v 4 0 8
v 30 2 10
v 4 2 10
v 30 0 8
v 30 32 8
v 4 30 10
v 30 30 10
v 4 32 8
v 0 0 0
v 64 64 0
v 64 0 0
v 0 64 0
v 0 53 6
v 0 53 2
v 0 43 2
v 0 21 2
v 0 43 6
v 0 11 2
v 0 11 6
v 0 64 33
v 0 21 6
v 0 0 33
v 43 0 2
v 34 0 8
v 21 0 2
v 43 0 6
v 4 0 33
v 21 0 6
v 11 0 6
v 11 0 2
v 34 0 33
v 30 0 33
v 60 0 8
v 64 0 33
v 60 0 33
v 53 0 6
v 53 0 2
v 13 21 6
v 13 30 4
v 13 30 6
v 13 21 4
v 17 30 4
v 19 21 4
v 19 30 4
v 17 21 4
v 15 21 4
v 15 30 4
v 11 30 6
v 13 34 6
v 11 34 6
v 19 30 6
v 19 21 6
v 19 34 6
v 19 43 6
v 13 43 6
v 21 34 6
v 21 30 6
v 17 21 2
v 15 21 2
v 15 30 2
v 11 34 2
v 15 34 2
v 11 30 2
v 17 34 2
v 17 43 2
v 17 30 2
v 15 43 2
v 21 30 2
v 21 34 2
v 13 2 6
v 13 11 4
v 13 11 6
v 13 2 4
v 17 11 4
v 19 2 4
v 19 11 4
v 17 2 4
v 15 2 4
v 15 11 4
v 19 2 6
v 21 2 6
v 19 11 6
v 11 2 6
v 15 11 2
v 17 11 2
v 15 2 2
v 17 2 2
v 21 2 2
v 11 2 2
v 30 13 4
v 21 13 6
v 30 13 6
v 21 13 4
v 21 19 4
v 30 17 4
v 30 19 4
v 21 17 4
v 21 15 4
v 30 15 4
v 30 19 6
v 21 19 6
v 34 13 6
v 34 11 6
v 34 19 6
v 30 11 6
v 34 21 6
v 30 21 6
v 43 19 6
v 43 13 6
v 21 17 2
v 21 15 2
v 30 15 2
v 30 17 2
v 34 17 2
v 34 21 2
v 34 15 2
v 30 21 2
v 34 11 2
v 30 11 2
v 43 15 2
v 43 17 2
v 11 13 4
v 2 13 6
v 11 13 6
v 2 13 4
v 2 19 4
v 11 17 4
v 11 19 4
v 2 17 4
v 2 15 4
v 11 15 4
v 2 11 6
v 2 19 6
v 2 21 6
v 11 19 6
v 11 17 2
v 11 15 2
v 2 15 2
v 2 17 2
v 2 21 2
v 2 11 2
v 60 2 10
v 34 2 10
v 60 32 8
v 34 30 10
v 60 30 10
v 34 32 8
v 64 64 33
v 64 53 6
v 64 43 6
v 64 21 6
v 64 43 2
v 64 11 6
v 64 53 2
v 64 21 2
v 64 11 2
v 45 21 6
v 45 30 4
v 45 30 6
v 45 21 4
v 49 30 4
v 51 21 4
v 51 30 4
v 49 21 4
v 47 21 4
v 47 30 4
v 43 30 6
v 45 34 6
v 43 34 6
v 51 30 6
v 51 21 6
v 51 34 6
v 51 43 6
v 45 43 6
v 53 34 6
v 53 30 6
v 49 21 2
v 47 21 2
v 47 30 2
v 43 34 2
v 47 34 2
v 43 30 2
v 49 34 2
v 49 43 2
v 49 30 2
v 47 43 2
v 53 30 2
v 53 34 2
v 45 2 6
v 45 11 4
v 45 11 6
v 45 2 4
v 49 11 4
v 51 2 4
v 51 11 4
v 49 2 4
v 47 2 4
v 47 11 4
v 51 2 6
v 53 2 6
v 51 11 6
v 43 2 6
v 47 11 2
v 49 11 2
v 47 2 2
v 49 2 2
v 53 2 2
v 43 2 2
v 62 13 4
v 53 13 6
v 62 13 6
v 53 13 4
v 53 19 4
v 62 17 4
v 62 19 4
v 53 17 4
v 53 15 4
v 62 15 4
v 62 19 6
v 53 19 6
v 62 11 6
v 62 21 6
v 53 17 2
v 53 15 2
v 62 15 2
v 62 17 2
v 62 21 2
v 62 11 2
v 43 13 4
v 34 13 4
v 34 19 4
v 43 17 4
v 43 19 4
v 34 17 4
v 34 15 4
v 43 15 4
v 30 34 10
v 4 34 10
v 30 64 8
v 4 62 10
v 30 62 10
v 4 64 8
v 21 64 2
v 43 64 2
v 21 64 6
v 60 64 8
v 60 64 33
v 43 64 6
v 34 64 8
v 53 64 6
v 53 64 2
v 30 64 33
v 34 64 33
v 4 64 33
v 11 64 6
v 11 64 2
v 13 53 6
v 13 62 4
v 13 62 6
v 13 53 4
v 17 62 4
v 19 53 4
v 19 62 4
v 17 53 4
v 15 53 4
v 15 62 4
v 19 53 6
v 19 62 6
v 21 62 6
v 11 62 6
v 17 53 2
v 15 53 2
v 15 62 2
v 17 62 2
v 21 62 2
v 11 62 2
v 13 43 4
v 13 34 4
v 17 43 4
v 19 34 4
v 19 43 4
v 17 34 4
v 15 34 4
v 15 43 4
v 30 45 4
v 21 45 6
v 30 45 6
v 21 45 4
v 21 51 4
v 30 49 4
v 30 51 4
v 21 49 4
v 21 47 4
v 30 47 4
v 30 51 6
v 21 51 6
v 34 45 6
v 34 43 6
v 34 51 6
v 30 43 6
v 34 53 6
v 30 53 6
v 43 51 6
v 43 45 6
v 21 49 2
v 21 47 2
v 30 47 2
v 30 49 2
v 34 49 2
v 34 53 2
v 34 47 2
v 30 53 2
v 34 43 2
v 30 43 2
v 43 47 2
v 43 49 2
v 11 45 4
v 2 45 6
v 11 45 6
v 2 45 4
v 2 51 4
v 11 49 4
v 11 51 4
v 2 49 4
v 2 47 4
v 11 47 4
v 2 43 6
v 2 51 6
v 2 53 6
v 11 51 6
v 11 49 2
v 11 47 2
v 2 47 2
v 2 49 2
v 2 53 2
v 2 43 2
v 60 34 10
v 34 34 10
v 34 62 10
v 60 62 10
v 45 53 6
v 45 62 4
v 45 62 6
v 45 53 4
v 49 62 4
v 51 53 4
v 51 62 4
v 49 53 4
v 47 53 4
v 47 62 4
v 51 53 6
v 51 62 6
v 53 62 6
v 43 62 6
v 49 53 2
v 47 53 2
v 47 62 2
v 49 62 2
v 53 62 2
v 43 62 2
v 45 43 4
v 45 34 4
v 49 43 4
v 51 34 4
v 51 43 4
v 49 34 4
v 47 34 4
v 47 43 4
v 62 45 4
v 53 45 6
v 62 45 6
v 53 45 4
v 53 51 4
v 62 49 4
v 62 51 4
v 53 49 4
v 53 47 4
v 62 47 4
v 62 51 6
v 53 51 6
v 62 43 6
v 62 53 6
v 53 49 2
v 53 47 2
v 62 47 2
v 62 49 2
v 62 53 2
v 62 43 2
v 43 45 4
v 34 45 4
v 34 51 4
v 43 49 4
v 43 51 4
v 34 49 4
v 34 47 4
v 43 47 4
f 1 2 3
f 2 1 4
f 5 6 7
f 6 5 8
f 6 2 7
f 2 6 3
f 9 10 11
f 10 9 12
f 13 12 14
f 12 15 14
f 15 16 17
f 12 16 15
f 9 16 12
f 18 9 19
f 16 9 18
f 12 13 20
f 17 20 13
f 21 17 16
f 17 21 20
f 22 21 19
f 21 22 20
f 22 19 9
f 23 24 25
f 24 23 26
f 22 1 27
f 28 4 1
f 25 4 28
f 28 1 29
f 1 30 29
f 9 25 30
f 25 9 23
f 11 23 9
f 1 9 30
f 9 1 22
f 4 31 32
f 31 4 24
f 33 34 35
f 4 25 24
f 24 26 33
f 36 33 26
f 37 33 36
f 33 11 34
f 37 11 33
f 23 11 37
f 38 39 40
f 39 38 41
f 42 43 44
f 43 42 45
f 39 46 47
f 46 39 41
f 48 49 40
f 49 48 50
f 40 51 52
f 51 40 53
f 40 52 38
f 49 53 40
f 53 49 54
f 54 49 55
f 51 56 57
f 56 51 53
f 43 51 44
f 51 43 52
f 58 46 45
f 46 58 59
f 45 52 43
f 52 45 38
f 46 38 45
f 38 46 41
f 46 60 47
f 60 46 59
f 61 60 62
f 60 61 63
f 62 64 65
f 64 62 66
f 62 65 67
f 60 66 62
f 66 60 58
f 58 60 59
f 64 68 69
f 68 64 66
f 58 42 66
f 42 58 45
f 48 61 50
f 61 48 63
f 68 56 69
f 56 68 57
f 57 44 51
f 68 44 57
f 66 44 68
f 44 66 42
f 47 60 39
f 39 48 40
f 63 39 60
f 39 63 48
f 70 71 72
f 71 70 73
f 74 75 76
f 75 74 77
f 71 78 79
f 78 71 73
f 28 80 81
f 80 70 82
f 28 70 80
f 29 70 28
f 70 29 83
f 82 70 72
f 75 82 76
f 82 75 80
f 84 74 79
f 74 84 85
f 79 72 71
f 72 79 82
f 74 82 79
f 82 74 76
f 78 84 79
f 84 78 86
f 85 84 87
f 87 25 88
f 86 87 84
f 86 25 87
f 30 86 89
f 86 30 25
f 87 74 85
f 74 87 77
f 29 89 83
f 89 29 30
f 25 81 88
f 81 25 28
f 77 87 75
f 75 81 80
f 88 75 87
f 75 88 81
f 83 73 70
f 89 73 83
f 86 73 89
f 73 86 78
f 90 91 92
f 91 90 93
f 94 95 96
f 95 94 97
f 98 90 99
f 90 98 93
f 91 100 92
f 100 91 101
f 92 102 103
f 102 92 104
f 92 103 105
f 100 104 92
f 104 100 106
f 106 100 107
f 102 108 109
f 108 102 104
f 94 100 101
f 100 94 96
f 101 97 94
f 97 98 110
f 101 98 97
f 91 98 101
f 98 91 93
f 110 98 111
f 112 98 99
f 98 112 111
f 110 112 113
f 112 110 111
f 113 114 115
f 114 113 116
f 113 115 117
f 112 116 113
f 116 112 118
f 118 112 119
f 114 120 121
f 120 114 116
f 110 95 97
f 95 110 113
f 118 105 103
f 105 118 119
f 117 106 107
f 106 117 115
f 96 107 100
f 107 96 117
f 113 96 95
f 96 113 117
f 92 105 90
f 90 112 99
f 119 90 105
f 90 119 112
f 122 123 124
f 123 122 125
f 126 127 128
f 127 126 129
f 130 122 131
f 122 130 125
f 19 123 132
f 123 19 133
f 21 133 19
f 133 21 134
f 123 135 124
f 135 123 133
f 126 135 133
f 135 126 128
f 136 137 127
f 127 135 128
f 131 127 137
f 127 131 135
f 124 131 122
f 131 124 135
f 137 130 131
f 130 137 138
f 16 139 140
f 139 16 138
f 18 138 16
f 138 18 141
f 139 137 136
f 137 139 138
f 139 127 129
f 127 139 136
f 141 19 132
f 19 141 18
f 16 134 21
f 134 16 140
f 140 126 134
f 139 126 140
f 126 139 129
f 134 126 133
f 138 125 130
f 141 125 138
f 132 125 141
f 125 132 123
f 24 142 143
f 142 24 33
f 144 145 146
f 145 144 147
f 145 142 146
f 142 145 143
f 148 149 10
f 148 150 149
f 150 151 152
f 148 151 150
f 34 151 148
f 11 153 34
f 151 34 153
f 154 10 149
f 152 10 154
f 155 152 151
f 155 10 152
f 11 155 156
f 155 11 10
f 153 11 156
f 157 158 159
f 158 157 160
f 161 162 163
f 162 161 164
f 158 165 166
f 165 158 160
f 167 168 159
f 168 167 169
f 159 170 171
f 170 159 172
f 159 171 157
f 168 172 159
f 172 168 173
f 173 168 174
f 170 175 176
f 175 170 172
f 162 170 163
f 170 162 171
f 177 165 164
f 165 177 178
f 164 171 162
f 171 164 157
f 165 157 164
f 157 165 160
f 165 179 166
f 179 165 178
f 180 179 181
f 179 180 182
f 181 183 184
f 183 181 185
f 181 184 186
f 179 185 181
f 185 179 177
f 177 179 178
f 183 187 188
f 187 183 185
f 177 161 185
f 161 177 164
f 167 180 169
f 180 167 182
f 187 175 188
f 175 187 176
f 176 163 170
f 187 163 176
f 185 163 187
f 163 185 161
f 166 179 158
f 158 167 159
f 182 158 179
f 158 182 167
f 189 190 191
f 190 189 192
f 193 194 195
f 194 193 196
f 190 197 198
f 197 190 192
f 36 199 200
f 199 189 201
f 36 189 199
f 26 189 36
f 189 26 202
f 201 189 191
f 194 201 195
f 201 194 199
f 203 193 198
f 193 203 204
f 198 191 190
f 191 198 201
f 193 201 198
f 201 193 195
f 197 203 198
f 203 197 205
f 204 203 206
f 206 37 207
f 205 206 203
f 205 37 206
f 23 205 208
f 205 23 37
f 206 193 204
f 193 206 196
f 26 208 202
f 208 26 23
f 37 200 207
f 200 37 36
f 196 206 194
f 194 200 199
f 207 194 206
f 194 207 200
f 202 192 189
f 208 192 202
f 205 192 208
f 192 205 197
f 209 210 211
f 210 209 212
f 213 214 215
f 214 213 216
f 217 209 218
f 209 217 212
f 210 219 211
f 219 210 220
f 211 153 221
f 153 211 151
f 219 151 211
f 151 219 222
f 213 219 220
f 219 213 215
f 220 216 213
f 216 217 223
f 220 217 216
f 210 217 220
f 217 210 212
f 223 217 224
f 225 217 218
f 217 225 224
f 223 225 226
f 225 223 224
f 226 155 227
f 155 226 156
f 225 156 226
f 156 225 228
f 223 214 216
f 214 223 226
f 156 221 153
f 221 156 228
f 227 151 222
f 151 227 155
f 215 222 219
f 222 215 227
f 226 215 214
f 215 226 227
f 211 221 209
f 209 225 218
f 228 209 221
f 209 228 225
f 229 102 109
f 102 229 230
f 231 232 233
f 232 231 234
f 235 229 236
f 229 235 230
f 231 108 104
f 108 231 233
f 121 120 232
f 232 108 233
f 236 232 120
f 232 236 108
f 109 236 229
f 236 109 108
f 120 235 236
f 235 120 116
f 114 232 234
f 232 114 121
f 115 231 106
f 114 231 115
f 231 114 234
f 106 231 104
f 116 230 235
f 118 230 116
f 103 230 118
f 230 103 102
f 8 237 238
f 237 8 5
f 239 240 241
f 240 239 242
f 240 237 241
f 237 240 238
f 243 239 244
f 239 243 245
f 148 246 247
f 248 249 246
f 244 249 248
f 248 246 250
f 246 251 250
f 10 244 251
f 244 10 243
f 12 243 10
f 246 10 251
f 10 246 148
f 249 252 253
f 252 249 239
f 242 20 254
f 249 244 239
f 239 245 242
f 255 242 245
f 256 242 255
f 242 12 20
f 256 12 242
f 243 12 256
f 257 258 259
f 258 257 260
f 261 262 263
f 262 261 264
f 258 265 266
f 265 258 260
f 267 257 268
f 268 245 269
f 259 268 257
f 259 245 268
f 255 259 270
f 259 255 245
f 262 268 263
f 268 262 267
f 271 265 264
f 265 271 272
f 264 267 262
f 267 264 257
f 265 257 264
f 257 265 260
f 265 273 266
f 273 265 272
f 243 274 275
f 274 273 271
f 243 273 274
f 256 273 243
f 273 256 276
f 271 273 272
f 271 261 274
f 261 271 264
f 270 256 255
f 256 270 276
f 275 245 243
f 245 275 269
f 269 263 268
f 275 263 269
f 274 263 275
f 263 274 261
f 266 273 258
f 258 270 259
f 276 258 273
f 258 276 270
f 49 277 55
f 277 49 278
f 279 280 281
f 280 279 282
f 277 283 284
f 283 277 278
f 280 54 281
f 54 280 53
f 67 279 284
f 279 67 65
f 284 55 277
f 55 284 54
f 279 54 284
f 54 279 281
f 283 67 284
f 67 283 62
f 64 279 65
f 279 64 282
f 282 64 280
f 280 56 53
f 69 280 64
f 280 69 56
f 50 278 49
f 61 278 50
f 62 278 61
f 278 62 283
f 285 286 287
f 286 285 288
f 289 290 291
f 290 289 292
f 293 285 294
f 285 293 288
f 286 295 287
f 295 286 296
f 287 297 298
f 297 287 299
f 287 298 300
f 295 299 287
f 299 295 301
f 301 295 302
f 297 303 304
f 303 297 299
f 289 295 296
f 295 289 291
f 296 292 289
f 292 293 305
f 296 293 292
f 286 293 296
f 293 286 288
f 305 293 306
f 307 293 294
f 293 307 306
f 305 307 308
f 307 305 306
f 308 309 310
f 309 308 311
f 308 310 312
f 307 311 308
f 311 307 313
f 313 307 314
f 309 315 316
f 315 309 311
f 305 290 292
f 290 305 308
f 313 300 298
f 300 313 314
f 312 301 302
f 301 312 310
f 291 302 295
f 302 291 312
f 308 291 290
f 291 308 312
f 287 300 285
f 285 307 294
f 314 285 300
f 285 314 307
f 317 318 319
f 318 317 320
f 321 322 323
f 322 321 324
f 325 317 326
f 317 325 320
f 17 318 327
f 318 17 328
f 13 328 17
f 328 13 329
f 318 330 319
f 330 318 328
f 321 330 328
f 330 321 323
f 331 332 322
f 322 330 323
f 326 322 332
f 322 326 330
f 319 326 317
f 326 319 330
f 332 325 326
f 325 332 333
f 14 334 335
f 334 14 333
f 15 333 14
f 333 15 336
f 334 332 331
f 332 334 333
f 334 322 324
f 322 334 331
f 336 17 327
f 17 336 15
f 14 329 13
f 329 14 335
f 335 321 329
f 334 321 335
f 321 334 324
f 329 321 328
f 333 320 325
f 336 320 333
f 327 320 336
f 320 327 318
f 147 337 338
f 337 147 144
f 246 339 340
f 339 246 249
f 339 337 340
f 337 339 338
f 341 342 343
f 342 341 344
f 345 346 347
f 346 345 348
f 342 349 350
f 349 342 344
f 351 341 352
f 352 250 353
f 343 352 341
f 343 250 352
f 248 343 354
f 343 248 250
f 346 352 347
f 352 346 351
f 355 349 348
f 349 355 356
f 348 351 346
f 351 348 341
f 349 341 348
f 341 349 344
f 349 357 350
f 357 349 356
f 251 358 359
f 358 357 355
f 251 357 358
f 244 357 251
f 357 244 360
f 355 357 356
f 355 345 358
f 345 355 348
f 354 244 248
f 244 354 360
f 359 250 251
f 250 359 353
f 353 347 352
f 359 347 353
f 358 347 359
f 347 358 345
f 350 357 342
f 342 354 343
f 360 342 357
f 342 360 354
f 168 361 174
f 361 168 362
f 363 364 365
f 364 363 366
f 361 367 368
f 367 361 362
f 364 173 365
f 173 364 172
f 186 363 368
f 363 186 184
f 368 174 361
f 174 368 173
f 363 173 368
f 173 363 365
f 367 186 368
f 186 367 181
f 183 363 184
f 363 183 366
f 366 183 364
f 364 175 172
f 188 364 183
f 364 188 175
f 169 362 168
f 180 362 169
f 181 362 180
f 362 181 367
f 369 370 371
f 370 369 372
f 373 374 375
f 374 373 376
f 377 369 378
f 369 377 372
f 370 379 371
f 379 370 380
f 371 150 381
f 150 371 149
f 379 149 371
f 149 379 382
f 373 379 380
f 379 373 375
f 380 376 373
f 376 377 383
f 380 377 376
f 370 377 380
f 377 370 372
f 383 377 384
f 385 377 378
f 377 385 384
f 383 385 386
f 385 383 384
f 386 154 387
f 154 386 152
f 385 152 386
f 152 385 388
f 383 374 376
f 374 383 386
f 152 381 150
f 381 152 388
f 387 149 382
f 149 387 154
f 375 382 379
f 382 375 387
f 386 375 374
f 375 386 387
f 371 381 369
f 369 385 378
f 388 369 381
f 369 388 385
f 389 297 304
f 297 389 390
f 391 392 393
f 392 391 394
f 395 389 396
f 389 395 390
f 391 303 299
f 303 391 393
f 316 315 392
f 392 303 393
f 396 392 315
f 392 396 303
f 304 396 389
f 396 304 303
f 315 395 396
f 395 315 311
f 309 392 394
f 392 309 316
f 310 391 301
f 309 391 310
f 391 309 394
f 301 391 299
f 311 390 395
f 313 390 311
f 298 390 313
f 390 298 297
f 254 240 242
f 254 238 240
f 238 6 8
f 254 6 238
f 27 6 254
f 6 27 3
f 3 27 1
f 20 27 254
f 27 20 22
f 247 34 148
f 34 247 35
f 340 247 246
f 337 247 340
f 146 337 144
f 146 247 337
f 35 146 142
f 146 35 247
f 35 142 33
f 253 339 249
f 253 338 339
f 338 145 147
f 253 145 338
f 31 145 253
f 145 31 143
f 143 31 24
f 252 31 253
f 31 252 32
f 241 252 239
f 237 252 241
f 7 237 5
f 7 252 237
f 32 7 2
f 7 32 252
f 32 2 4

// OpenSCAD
// file: ModularDungeonTileLibrary.scad
//Constants
wallleft = 0;
wallbottom = 1;
wallright = 2;
walltop = 3;
wallcenter = 4;
walldoubleright = 5;


//Variables
size = 32;
connectorlength = size-10;
connectorwidth = 6;
connectorheight = 4;
baseheight = 8;
topperheight = 2;
topperrounded = true;
walllength = size;
wallheight = 25;
wallwidth = 6;
wallwidththin = 4;


//Functions
function hypotenuse_ra(side_a, side_b) =
    sqrt(pow(side_a, 2) + pow(side_b, 2));
    
    
//Modules    
module mtdl_Base_Connector(cw,cl,ch) {
    translate([-connectorwidth/2,-connectorlength/2,-connectorheight/2]) {
        cube([cw,cl,ch/2]);
        translate([cw/3,0,ch/2])
            cube([cw/3,cl,ch/2]);
        translate([-(cw-2)/2,cl/2-2,0])
            cube([cw+4,4,ch]);
    }
}

module mdtl_Base(s,bh)
{
    cube([s,s,bh]);
}

module mdtl_Topper(s,bh,th,tr)
{
    if (tr) {
        translate([0,0,bh])
            intersection() {
                difference () {
                        cube([s,s,th]);
                        union () {
                        rotate(a=45, v=[1,0,0])
                            cube([s,th*2,th*2]);
                        translate([0,s,0])
                            rotate(a=45, v=[1,0,0])
                                cube([s,th*2,th*2]);
                        rotate(a=-45, v=[0,1,0])
                            cube([th*2,s,th*2]);
                        translate([s,0,0])
                            rotate(a=-45, v=[0,1,0])
                                cube([th*2,s,th*2]);
                        }
                }
                translate([s/2,s/2,0])
                    cylinder(
                        h=th, 
                        r1=hypotenuse_ra(s/2-1.2, s/2-1.2), 
                        r2=hypotenuse_ra(s/2-th-.8, s/2-th-.8), 
                        center=false, 
                        $fa=.1);
            }    
    }
    else {
        translate([0,0,bh])
            difference() {
                cube([s,s,th]);
                union () {
                rotate(a=45, v=[1,0,0])
                    cube([s,th*2,th*2]);
                translate([0,s,0])
                    rotate(a=45, v=[1,0,0])
                        cube([s,th*2,th*2]);
                rotate(a=-45, v=[0,1,0])
                    cube([th*2,s,th*2]);
                translate([s,0,0])
                    rotate(a=-45, v=[0,1,0])
                        cube([th*2,s,th*2]);
                }
            }    
    }
}

module mdtl_Base_1x1(s,bh,th,tr) 
{
    difference () {
        union () {
            mdtl_Base(s,bh);
            mdtl_Topper(s,bh,th,tr);
        }
        union () {
            translate([size/2,size,baseheight/2])
                rotate([0,180,0])
                    mtdl_Base_Connector(connectorwidth,connectorlength,connectorheight);
            translate([size/2,0,baseheight/2])
                rotate([0,180,0])
                    mtdl_Base_Connector(connectorwidth,connectorlength,connectorheight);
            translate([size,size/2,baseheight/2])
                rotate([0,180,90])
                    mtdl_Base_Connector(connectorwidth,connectorlength,connectorheight);
            translate([0,size/2,baseheight/2])
                rotate([0,180,90])
                    mtdl_Base_Connector(connectorwidth,connectorlength,connectorheight);
        }
    }
}

module mdtl_Base_1x2(s,bh,th,tr)
{
    union () {
        mdtl_Base_1x1(s,bh,th,tr);
        translate([s,0,0])
            mdtl_Base_1x1(s,bh,th,tr);
    }
}
 
module mdtl_Base_2x2(s,bh,th,tr)
{
    union () {
        mdtl_Base_1x2(s,bh,th,tr);
        translate([0,s,0])
            mdtl_Base_1x2(s,bh,th,tr);
    }
}
 
module mdtl_Base_2x4(s,bh,th,tr)
{
    union () {
        mdtl_Base_2x2(s,bh,th,tr);
        translate([s*2,0,0])
            mdtl_Base_2x2(s,bh,th,tr);
    }
}
 
module mdtl_Base_4x4(s,bh,th,tr)
{
    union () {
        mdtl_Base_2x4(s,bh,th,tr);
        translate([0,s*2,0])
            mdtl_Base_2x4(s,bh,th,tr);
    }
}
 
module mdtl_Wall_1(w,l,h)
{
    translate([0,0,baseheight])
        cube([w,l,h]);   
}

module mdtl_Wall_1_Position(w,l,h,p)
{
    if (p==0) {
        mdtl_Wall_1(w,l,h);
    }
    
    else if (p==1) {
        rotate(a=-90)
           translate([-w,0,0])
               mdtl_Wall_1(w,l,h);       
    }
    
    else if (p==2) {
        translate([(size)-w,0,0])
            mdtl_Wall_1(w,l,h);
    }
    
    else if (p==3) {
        rotate(a=-90)
            translate([-l,0,0])
                mdtl_Wall_1(w,l,h);
    }
    
    else if (p==4) {
        translate([(size)-w/2,0,0])
            mdtl_Wall_1(w,l,h);
    }
    
    else if (p==5) {
        translate([(size*2)-w,0,0])
           mdtl_Wall_1(w,l,h);       
    }
}

module mdtl_Wall_2(w,l,h)
{
    union() {
        mdtl_Wall_1(w,l,h);
        translate([0,l,0])
            mdtl_Wall_1(w,l,h);
    }
}

module mdtl_Wall_2_Position(w,l,h,p)
{
    if (p==0) {
        mdtl_Wall_2(w,l,h);
    }
    
    else if (p==1) {
        rotate(a=-90)
            translate([-w,0,0])
                mdtl_Wall_2(w,l,h);
    }
    
    else if (p==2) {
    translate([(size*2)-w,0,0])
        mdtl_Wall_2(w,l,h);
    }
    
    else if (p==3) {
        rotate(a=-90)
            translate([-l*2,0,0])
                mdtl_Wall_2(w,l,h);
    }
    
    else if (p==4) {
        translate([(size)-w/2,0,0])
            mdtl_Wall_2(w,l,h);
    }
}
// main file
include <ModularDungeonTileLibrary.scad>; 
 
mdtl_Base_2x2(size,baseheight,topperheight,topperrounded=false);
mdtl_Wall_2_Position(wallwidththin,walllength,wallheight,wallleft);
mdtl_Wall_2_Position(wallwidththin,walllength,wallheight,wallright);
mdtl_Wall_2_Position(wallwidththin,walllength,wallheight,wallcenter);
